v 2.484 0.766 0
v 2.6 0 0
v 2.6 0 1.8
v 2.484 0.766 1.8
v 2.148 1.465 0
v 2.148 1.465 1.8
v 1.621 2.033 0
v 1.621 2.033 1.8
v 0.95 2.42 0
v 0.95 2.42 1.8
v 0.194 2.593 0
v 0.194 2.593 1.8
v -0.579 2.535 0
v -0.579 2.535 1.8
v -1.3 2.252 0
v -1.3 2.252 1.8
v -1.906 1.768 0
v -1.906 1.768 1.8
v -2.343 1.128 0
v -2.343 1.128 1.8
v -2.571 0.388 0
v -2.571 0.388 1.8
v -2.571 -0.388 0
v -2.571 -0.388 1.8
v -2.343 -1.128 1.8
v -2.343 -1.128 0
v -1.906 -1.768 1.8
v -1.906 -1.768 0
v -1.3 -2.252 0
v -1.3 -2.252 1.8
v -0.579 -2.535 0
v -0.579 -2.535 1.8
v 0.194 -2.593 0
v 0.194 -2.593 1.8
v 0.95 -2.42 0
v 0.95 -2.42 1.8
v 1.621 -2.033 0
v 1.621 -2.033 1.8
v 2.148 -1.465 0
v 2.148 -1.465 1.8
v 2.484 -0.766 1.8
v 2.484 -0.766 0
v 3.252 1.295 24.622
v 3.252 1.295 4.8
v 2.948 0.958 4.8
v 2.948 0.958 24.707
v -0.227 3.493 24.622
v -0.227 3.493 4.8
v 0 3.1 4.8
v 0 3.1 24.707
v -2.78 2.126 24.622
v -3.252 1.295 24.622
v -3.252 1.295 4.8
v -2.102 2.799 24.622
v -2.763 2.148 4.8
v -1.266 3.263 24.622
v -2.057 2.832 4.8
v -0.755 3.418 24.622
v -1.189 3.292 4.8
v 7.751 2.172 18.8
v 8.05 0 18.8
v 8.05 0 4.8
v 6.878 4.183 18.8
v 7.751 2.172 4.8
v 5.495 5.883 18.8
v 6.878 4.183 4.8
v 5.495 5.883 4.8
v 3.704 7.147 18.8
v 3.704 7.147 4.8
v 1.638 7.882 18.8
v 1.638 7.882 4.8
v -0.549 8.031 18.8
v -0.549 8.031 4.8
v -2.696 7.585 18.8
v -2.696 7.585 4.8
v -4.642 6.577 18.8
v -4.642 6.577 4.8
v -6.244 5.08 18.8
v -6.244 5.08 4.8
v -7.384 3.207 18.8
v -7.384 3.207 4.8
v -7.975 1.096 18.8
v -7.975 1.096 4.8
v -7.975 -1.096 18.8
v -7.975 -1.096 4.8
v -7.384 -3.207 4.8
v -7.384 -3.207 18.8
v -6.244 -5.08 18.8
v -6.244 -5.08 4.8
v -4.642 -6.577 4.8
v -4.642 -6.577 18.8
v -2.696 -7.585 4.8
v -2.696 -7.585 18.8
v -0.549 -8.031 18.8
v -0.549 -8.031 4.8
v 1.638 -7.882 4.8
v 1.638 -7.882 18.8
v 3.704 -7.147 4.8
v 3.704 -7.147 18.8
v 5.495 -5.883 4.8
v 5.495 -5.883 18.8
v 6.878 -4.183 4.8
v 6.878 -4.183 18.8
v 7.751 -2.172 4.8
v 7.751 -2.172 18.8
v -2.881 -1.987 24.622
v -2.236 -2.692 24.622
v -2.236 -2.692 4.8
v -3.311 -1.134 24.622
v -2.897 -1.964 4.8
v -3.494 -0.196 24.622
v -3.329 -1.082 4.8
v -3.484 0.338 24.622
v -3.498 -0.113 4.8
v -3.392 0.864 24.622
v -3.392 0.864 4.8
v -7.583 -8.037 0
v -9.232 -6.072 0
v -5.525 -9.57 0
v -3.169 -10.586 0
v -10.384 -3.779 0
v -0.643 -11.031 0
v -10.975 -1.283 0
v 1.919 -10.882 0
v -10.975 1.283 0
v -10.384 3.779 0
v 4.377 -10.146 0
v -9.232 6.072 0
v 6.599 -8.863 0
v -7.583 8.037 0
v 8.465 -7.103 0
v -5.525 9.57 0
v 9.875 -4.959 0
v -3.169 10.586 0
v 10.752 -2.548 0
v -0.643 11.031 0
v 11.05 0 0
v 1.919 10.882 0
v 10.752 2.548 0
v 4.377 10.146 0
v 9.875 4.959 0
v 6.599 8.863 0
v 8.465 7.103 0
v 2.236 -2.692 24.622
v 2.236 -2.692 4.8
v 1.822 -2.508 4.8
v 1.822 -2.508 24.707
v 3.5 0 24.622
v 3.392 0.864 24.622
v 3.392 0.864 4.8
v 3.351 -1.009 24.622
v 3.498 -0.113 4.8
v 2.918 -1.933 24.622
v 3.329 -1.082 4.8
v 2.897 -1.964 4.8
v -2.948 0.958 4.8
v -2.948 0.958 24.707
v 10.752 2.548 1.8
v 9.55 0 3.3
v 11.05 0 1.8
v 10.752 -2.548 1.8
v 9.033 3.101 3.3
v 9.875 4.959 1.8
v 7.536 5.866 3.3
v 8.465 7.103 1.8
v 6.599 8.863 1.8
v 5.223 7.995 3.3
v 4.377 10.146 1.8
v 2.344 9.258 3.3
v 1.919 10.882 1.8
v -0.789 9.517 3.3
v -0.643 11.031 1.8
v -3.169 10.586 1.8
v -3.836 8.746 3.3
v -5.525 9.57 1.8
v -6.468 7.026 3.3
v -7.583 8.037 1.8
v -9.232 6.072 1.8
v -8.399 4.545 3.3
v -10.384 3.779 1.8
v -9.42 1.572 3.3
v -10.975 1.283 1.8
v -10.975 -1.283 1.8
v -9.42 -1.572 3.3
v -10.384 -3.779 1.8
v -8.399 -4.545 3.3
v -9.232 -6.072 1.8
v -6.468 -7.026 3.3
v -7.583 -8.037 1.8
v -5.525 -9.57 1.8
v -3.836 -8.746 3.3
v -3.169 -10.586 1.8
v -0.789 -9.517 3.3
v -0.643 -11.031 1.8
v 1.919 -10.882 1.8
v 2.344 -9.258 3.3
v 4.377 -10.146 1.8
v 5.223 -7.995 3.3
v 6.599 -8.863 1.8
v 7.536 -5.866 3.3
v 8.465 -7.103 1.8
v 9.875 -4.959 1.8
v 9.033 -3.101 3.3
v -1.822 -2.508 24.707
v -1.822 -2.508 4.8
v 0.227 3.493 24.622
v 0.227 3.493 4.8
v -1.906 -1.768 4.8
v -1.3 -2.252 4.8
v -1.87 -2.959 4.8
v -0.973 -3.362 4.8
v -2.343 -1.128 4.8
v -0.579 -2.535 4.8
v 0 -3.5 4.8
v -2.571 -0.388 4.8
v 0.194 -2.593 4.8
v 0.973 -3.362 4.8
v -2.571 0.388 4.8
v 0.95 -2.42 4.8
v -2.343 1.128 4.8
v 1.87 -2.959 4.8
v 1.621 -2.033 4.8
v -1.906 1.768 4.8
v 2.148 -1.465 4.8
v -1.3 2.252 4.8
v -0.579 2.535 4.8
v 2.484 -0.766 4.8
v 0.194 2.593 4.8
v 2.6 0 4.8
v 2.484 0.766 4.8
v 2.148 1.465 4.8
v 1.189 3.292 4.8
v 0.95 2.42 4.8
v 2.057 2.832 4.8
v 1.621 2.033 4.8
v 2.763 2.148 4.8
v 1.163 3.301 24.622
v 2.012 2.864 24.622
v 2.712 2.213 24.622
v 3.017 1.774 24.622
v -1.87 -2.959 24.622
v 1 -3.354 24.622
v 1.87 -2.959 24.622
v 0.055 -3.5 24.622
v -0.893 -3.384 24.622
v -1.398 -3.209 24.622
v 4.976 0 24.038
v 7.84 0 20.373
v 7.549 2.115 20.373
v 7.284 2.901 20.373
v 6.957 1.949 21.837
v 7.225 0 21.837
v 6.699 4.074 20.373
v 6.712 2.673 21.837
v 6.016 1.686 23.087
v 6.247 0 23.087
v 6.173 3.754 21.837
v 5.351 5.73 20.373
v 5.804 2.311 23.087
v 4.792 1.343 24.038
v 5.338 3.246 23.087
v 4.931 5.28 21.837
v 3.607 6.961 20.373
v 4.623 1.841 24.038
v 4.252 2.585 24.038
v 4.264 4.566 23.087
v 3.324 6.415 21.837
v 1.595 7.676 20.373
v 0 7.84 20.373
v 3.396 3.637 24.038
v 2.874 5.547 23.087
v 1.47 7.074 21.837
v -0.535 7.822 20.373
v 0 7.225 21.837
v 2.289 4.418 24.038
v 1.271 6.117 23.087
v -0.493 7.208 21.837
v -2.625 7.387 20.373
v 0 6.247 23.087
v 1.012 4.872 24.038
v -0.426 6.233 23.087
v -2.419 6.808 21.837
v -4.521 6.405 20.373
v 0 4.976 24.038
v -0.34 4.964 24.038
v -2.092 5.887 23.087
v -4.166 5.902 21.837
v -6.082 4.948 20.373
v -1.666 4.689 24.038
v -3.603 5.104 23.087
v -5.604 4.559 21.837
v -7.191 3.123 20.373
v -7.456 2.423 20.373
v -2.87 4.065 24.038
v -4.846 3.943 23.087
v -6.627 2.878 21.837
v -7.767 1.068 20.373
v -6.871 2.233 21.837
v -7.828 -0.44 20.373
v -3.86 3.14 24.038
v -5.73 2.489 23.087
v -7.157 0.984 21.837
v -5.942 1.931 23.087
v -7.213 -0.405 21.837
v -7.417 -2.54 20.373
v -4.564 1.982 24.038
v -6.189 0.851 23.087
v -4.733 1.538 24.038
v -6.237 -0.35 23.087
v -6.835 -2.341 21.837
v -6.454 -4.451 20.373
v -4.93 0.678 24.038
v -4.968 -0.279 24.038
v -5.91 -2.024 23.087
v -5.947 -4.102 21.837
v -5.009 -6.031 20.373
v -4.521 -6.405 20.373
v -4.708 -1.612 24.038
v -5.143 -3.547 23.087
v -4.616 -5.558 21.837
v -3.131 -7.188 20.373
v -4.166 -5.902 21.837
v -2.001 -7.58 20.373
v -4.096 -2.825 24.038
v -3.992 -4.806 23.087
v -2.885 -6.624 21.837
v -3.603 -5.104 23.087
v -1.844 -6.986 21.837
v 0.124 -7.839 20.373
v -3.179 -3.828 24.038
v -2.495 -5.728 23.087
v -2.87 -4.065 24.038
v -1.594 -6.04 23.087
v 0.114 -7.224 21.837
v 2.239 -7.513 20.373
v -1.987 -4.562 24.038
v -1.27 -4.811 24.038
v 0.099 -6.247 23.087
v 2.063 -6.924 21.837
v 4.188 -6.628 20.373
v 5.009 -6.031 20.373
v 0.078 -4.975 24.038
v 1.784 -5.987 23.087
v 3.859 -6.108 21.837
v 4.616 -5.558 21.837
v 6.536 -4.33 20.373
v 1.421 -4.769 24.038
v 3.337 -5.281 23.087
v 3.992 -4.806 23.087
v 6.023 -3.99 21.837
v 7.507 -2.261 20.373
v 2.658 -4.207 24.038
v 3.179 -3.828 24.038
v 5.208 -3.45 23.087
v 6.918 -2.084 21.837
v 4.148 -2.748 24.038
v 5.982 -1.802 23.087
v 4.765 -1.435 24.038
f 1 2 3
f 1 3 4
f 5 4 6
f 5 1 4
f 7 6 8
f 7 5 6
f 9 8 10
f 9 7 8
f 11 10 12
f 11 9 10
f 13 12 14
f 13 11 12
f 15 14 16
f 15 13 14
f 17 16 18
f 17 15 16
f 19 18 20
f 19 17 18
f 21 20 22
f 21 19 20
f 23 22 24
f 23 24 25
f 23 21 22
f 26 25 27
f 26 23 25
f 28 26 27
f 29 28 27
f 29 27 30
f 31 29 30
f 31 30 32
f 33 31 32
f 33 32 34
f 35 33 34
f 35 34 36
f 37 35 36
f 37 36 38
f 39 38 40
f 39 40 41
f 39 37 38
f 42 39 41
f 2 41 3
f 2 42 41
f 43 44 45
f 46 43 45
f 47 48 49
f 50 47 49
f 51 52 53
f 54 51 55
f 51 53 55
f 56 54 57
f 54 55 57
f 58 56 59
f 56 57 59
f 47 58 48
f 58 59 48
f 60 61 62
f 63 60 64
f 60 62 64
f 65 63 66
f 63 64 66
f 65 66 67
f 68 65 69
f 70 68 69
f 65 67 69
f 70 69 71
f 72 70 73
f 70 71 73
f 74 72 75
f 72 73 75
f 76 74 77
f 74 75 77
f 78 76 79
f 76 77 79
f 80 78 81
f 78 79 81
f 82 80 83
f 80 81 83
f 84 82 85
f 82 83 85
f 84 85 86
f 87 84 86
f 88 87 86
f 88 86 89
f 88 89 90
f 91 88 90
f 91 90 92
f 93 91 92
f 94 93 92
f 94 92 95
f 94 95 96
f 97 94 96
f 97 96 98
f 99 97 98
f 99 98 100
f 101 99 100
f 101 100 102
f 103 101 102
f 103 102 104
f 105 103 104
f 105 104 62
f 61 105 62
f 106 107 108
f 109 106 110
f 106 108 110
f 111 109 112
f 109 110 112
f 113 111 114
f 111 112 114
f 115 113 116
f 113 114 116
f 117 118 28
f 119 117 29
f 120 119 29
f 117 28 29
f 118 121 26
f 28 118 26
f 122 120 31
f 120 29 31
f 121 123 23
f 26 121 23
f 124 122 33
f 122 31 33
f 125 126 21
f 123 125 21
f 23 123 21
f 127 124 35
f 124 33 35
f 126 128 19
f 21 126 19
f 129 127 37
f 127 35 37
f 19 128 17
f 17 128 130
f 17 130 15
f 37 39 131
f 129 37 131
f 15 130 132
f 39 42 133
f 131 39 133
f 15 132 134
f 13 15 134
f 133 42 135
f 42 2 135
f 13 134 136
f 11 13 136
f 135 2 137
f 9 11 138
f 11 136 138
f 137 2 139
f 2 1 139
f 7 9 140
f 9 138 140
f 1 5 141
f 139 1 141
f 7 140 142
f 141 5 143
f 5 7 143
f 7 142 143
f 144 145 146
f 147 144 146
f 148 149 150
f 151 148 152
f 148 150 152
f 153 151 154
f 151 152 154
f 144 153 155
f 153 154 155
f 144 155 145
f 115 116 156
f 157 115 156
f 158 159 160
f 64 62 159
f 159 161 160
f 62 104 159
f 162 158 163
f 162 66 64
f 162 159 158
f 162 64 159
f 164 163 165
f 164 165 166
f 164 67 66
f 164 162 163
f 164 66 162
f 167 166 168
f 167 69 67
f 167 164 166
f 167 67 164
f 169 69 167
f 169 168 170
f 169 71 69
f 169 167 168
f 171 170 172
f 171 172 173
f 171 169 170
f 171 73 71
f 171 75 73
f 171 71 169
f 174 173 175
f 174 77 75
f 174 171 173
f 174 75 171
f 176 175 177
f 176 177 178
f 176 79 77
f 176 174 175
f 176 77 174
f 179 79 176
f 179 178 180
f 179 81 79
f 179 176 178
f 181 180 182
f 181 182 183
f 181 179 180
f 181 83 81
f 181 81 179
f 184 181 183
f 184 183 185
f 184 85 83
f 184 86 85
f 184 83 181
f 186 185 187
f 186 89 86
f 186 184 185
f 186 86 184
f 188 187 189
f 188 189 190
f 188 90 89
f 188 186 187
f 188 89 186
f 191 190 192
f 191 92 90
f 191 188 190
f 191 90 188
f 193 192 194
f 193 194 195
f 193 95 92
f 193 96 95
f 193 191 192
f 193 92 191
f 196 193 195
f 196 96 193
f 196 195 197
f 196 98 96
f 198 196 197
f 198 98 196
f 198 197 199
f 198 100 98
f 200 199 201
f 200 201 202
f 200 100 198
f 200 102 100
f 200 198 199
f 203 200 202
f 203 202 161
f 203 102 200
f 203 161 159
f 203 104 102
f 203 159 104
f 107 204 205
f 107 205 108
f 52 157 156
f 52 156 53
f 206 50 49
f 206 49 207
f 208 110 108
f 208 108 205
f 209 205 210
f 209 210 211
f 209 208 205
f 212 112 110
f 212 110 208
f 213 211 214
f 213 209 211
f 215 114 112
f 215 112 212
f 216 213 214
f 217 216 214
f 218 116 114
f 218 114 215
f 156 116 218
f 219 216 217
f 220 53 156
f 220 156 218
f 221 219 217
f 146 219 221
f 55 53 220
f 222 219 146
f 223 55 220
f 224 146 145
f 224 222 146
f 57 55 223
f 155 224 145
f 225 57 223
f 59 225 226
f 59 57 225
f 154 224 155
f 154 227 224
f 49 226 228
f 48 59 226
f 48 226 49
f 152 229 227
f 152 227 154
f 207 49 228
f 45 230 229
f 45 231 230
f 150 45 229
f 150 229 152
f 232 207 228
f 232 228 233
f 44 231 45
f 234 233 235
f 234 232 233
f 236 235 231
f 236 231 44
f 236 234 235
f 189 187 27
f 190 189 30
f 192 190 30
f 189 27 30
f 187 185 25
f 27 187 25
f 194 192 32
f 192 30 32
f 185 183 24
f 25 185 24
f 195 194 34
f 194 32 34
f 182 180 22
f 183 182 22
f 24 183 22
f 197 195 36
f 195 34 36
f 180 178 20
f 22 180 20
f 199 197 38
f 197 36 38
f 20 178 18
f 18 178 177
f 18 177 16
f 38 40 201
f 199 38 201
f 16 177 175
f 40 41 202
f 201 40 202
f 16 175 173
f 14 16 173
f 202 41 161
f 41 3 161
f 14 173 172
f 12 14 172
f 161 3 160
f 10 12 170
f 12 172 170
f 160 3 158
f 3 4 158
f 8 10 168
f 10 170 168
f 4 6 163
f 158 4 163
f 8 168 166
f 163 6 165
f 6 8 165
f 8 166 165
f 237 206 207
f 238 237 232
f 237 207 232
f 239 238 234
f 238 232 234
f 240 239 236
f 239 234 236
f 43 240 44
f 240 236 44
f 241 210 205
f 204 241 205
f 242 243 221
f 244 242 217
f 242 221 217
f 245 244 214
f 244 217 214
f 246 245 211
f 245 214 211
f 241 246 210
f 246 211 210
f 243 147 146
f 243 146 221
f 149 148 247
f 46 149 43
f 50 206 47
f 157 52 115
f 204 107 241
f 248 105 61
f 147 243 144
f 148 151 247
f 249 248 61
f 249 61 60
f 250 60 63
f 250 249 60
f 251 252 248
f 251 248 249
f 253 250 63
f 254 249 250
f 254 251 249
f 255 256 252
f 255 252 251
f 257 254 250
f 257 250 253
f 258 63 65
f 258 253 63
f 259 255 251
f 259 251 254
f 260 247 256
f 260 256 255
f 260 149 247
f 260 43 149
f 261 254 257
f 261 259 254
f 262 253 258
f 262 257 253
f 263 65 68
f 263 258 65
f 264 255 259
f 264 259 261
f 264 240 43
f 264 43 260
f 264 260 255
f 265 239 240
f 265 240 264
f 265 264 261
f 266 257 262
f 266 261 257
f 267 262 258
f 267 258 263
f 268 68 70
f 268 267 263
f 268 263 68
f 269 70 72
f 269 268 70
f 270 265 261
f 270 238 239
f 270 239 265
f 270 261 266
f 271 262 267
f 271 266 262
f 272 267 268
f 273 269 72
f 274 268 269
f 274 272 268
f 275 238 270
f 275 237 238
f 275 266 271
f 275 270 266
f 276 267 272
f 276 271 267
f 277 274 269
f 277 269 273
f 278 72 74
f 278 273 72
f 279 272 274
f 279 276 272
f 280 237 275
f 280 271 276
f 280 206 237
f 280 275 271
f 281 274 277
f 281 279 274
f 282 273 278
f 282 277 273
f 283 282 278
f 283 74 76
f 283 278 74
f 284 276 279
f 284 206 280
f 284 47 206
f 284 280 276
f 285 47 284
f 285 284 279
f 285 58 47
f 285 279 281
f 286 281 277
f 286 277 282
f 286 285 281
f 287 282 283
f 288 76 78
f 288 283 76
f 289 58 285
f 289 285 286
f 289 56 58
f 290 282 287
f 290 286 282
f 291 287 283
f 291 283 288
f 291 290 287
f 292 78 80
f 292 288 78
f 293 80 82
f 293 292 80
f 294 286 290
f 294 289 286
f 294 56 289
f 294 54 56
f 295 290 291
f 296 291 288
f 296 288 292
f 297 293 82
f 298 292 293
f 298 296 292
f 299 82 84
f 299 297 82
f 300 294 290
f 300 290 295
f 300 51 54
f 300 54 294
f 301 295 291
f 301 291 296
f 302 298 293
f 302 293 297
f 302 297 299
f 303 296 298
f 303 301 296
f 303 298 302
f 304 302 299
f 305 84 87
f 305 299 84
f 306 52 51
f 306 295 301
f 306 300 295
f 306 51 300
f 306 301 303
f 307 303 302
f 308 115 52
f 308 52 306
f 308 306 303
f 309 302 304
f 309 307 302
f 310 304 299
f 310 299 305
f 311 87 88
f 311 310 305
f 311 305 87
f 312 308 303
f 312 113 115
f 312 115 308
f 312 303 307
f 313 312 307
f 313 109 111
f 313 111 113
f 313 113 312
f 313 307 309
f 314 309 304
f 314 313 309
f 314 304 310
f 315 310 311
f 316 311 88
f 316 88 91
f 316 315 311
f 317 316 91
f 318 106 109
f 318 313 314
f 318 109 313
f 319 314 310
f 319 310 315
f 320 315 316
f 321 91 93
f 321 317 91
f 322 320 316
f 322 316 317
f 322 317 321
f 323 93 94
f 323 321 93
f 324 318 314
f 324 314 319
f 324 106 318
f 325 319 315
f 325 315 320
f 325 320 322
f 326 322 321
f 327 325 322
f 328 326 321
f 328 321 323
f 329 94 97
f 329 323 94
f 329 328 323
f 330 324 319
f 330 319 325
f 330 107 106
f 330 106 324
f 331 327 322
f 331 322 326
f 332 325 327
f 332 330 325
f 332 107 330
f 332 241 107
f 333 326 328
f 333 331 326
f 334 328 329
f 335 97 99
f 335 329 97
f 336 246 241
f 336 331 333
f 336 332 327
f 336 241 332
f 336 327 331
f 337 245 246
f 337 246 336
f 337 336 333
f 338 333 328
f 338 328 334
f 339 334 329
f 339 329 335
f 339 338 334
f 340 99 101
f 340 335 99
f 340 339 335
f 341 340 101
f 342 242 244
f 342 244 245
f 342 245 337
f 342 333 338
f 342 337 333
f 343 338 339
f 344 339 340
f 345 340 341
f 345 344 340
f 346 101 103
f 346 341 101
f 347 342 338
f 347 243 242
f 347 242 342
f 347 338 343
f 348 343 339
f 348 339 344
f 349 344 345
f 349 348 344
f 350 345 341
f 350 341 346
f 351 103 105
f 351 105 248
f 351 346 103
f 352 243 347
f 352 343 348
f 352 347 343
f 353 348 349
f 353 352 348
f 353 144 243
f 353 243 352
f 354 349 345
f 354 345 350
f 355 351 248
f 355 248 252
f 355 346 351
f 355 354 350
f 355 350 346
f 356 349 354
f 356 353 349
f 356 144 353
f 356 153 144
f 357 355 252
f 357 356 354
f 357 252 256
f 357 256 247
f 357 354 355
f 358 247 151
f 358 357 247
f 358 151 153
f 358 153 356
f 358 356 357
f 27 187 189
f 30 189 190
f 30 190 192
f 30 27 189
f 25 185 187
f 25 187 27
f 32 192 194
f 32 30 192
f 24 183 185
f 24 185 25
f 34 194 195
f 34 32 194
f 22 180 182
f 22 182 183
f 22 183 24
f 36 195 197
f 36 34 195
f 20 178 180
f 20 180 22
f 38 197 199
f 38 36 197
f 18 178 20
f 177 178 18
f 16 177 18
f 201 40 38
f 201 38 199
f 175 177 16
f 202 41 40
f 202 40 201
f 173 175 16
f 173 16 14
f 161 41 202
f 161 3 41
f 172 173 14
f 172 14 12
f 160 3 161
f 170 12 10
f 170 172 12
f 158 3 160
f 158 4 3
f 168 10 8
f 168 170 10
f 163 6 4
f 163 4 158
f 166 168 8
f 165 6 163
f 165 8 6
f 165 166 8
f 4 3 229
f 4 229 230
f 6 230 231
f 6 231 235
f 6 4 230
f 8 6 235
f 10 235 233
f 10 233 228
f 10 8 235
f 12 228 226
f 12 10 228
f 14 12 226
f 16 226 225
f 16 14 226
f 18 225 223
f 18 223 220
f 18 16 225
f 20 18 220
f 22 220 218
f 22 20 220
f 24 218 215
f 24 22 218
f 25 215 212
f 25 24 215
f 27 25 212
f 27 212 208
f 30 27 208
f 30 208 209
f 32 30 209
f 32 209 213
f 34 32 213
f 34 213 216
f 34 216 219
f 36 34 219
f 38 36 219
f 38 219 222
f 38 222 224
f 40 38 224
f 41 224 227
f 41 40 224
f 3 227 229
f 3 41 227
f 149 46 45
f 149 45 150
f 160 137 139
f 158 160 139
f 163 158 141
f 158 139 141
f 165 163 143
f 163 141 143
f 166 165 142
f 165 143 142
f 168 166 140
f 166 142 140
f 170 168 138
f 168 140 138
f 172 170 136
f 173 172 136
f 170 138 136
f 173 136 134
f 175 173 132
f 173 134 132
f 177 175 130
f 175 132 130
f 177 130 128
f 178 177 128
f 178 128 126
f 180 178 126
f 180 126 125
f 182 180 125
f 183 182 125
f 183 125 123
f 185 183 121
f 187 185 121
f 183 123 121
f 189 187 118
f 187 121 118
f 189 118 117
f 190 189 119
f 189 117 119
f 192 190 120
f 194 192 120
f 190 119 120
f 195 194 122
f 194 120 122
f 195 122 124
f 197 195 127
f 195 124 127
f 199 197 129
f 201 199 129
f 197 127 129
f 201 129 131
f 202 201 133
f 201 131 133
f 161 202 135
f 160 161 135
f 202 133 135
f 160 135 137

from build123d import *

# Parameters (mm, degrees)
F0_R     = 11.05
F0_R_2   = 2.6
F1_DEPTH = 1.8
F2_R     = 11.05
F2_R_2   = 2.6
F3_DEPTH = 3
F4_SIZE  = 2.99999
F5_R     = 8.05
F6_DEPTH = 20


# Not quite as in the source:
# - a fillet or chamfer that OpenCascade refuses, or shapes differently, is made with other operations: its cross-section is extruded or revolved along the edge and cut away or added
# - a fillet or chamfer is up to 0.001 mm smaller than in the source, because OpenCascade refuses the exact size


with BuildPart() as f1:
    # F0 (on Top) → F1 (new body)
    with BuildSketch(Plane.XY):
        Circle(F0_R)
        Circle(F0_R_2, mode=Mode.SUBTRACT)
    extrude(amount=F1_DEPTH)


with BuildPart() as f3:
    # F2 (on face) → F3 (new body)
    with BuildSketch(Plane.XY.offset(1.8)):
        Circle(F2_R)
        Circle(F2_R_2, mode=Mode.SUBTRACT)
    extrude(amount=F3_DEPTH)

    # F4 (size 3 in the source; OpenCascade refuses exactly that, so slightly less here)
    f4_edges = [f3.edges().sort_by_distance(p)[0] for p in [
        (-11.05, 0, 4.8),
    ]]
    chamfer(f4_edges, length=F4_SIZE)

    # F5 (on face) → F6 (join)
    with BuildSketch(Plane.XY.offset(4.8)):
        Circle(F5_R)
        with BuildLine():
            ThreePointArc((-3.2516549392, 1.2948900171), (-2.057248383, 2.8315594803), (-0.2266969526, 3.4926506398))
            Line((-0.2266969526, 3.4926506398), (0, 3.1))
            Line((0, 3.1), (0.2266969526, 3.4926506398))
            ThreePointArc((0.2266969526, 3.4926506398), (2.057248383, 2.8315594803), (3.2516549392, 1.2948900171))
            Line((3.2516549392, 1.2948900171), (2.9482752005, 0.9579526826))
            Line((2.9482752005, 0.9579526826), (3.391761361, 0.8636867891))
            ThreePointArc((3.391761361, 0.8636867891), (3.328697807, -1.0815594803), (2.2363302247, -2.6923645975))
            Line((2.2363302247, -2.6923645975), (1.8221342821, -2.5079526826))
            Line((1.8221342821, -2.5079526826), (1.8695268503, -2.9588628485))
            ThreePointArc((1.8695268503, -2.9588628485), (0, -3.5), (-1.8695268503, -2.9588628485))
            Line((-1.8695268503, -2.9588628485), (-1.8221342821, -2.5079526826))
            Line((-1.8221342821, -2.5079526826), (-2.2363302247, -2.6923645975))
            ThreePointArc((-2.2363302247, -2.6923645975), (-3.328697807, -1.0815594803), (-3.391761361, 0.8636867891))
            Line((-3.391761361, 0.8636867891), (-2.9482752005, 0.9579526826))
            Line((-2.9482752005, 0.9579526826), (-3.2516549392, 1.2948900171))
        make_face(mode=Mode.SUBTRACT)
    extrude(amount=F6_DEPTH)

    # F7: fillet of radius 6 on 1 edges, made by hand

    # F7_s1 → F7_t2 (revolve, cut)
    with BuildSketch(Plane.XZ):
        with BuildLine():
            ThreePointArc((8.05, 18.8), (6.2926406871, 23.0426406871), (2.05, 24.8))
            Line((2.05, 24.8), (8.05, 24.8))
            Line((8.05, 24.8), (8.05, 18.8))
        make_face()
    revolve(axis=Axis((0, 0, 24.8), (0, 0, 1)), mode=Mode.SUBTRACT)


solid = Compound([f1.part, f3.part])
